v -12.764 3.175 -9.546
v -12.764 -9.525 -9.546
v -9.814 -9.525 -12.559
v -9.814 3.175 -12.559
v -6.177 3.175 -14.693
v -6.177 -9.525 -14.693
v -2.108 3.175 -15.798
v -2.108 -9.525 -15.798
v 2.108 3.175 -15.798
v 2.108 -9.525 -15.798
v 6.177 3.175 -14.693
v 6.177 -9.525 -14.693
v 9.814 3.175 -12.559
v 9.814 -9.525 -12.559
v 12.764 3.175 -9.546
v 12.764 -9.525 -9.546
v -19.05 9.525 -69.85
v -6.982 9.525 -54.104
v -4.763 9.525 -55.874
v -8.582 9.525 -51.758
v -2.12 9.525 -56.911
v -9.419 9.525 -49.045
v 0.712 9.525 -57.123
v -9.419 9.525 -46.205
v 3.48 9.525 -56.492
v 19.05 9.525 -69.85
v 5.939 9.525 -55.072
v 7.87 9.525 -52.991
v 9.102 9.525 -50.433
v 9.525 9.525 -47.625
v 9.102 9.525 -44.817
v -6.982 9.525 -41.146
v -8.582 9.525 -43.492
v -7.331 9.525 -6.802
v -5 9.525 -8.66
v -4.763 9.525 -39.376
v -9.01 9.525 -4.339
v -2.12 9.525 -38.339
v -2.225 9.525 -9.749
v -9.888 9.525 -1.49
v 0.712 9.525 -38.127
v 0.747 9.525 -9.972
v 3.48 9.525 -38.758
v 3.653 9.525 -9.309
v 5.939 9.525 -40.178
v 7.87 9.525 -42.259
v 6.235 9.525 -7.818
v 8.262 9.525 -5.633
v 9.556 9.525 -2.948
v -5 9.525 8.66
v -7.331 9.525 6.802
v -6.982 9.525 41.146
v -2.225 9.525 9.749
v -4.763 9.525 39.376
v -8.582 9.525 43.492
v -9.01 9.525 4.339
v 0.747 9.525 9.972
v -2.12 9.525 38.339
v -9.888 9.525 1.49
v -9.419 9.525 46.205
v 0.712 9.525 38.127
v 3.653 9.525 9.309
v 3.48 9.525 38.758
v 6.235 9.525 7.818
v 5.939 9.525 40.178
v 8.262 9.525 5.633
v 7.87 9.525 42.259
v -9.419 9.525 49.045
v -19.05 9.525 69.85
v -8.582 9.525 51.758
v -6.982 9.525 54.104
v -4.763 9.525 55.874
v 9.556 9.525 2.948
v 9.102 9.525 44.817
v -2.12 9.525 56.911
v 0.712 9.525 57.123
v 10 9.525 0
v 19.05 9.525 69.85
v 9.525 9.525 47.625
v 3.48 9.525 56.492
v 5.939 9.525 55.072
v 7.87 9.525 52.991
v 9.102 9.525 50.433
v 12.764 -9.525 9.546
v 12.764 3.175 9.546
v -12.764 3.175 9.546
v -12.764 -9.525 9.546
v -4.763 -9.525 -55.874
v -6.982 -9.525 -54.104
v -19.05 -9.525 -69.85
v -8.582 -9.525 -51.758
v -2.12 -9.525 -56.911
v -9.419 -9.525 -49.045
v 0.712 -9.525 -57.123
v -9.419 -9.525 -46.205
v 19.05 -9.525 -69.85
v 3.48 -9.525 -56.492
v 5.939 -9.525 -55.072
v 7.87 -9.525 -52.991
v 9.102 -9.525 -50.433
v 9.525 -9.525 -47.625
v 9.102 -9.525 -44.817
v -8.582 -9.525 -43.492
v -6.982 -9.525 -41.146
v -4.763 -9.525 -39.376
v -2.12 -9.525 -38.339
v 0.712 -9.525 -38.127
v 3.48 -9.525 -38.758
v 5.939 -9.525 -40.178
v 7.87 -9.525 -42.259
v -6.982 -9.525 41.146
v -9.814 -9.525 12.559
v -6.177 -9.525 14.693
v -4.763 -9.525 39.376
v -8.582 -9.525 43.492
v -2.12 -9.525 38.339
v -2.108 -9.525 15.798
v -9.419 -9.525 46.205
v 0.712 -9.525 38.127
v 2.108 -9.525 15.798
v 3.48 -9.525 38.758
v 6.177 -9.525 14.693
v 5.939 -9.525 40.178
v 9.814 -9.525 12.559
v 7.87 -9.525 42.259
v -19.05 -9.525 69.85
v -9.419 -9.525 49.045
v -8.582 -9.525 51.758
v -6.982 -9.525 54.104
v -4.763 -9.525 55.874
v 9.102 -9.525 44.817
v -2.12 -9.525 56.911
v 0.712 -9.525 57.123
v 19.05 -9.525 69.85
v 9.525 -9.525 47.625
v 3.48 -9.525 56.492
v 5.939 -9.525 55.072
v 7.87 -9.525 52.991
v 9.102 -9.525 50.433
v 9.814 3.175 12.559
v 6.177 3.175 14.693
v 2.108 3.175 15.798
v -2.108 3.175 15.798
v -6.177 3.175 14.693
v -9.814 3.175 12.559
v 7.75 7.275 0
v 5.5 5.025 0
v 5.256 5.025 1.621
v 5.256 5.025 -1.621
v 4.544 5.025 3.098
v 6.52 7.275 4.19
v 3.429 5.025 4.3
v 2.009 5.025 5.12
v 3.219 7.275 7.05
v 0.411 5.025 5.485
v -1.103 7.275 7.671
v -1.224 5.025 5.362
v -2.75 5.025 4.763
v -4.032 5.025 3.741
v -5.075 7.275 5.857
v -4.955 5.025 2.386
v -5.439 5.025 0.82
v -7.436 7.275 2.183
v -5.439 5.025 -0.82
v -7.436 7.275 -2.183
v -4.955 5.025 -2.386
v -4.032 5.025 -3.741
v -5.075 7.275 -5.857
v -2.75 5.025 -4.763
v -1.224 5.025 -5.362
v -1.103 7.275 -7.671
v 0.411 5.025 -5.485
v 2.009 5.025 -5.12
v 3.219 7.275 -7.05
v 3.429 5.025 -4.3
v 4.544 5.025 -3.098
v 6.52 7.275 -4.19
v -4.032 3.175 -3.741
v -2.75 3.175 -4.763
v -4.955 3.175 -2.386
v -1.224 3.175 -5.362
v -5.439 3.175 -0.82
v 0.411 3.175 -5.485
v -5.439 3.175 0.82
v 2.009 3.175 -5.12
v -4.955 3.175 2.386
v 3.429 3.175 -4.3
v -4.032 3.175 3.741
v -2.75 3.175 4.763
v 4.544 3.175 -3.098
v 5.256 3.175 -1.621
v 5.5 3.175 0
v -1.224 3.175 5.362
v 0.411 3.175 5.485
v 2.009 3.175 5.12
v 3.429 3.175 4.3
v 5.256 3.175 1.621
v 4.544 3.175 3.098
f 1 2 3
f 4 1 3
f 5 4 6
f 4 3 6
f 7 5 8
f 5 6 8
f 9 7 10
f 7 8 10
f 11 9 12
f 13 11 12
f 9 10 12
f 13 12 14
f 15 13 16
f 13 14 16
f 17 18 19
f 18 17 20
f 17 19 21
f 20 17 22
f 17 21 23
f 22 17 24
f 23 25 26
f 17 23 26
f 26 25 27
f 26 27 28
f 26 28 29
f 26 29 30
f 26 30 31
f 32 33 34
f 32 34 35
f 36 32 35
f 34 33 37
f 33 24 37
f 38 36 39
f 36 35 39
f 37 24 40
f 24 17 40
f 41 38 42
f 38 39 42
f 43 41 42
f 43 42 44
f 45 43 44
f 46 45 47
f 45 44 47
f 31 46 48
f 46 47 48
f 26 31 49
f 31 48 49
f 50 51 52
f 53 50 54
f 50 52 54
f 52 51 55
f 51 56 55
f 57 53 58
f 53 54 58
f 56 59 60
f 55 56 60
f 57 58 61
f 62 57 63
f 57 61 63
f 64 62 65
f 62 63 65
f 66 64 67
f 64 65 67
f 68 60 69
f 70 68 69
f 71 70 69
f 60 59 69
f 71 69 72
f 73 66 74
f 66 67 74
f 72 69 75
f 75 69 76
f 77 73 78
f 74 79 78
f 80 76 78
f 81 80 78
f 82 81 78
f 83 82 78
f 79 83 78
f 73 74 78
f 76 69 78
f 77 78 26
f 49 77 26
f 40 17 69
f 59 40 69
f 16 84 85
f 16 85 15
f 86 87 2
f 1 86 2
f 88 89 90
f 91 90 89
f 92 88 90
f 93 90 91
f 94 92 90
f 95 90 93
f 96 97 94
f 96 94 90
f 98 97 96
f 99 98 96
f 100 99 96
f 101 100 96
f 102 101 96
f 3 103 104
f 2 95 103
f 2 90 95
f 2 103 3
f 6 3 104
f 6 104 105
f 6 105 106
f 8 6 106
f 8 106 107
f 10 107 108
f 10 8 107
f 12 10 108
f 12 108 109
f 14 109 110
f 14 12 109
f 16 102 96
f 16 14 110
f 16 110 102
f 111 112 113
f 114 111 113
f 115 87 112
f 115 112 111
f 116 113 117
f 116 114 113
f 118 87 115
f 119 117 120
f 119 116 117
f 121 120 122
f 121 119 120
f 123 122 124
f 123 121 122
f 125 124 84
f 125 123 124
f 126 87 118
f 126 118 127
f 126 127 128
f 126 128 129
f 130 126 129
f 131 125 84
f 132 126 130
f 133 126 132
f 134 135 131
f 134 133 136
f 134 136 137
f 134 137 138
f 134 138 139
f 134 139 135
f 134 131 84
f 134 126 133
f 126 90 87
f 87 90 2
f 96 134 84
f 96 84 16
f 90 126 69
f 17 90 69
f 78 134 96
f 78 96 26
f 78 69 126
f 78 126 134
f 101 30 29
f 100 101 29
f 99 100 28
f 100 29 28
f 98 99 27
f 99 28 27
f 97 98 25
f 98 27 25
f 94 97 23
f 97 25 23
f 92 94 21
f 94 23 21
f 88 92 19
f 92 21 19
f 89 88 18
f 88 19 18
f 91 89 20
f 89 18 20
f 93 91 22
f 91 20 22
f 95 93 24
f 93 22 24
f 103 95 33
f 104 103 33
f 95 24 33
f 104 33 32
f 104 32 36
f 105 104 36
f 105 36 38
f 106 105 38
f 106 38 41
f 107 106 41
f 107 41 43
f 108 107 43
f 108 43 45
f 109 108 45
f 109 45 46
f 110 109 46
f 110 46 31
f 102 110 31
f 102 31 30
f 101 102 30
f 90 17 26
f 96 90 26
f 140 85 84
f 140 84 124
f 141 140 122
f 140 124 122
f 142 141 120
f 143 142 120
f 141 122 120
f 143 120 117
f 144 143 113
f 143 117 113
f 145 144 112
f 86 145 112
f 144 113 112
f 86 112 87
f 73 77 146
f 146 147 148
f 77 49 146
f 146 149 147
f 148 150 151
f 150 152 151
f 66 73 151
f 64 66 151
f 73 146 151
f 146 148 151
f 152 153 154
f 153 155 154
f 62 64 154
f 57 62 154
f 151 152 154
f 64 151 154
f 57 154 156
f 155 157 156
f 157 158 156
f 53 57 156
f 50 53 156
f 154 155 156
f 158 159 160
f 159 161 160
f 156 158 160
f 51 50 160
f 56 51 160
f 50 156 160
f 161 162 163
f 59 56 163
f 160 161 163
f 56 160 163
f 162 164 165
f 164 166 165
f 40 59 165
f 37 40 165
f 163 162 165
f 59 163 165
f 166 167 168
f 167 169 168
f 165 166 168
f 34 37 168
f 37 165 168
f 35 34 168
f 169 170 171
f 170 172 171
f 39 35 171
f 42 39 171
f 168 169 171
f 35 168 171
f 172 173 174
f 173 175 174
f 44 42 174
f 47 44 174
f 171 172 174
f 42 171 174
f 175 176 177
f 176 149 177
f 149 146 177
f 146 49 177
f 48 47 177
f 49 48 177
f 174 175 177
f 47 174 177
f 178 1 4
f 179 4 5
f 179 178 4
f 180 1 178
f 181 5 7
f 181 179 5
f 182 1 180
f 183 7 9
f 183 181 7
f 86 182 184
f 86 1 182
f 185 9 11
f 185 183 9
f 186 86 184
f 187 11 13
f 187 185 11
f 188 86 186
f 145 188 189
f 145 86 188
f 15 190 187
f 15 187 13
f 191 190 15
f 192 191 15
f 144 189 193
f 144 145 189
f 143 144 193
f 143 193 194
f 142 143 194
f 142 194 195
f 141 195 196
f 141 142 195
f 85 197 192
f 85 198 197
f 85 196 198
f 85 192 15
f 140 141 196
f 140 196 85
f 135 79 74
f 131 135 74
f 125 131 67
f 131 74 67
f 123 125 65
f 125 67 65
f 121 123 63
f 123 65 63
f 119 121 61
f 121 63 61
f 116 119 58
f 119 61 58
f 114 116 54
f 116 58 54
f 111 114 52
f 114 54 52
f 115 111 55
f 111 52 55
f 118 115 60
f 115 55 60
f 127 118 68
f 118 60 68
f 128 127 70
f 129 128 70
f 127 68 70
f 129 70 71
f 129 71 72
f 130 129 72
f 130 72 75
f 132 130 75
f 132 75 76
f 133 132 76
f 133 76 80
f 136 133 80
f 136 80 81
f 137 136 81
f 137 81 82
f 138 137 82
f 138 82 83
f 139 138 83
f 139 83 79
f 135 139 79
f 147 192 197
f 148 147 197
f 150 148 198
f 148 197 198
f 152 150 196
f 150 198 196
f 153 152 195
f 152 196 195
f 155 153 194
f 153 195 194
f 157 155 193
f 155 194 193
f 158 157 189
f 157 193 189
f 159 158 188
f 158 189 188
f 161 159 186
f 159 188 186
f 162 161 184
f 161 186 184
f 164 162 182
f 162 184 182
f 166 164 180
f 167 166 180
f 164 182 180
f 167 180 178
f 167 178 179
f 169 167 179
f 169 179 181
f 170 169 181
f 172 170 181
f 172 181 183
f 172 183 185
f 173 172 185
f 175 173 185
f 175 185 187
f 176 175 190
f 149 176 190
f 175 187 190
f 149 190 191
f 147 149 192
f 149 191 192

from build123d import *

# Parameters (mm, degrees)
SKETCH1_W                                        = 38.1
SKETCH1_H                                        = 19.05
EXTRUDE1_DEPTH                                   = 69.85
CUT_EXTRUDE1_REACH                               = 21.05
SKETCH2_R                                        = 9.525
CSK_FOR_M10_FLAT_HEAD_MACHINE_SCREW1_D           = 11
CSK_FOR_M10_FLAT_HEAD_MACHINE_SCREW1_DEPTH       = 29.464
CSK_FOR_M10_FLAT_HEAD_MACHINE_SCREW1_CSINK_D     = 20
CSK_FOR_M10_FLAT_HEAD_MACHINE_SCREW1_CSINK_ANGLE = 90
CSK_FOR_M10_FLAT_HEAD_MACHINE_SCREW1_TIP         = 3.304733405
SKETCH5_R                                        = 15.9385
CUT_EXTRUDE2_DEPTH                               = 12.7
BOSS_EXTRUDE1_DEPTH                              = 12.7


with BuildPart() as part:
    # Sketch1 → Extrude1 (new body, symmetric)
    with BuildSketch(Plane.XY):
        Rectangle(SKETCH1_W, SKETCH1_H)
    extrude(amount=EXTRUDE1_DEPTH, both=True)

    # Sketch2 → Cut-Extrude1 (cut, up to next)
    with BuildSketch(Plane(origin=(0, 9.525, 0), x_dir=(1, 0, 0), z_dir=(0, 1, 0)), mode=Mode.PRIVATE) as cut_extrude1_sk1:
        with Locations((0, 47.625)):
            Circle(SKETCH2_R)
    cut_extrude1_tool1 = extrude(cut_extrude1_sk1.sketch, amount=-CUT_EXTRUDE1_REACH, mode=Mode.PRIVATE) & part.part
    add(cut_extrude1_tool1.solids().sort_by_distance((0, 9.525, -47.625))[0], mode=Mode.SUBTRACT)
    # Sketch2 → Cut-Extrude1 (cut, up to next)
    with BuildSketch(Plane(origin=(0, 9.525, 0), x_dir=(1, 0, 0), z_dir=(0, 1, 0)), mode=Mode.PRIVATE) as cut_extrude1_sk2:
        with Locations((0, -47.625)):
            Circle(SKETCH2_R)
    cut_extrude1_tool2 = extrude(cut_extrude1_sk2.sketch, amount=-CUT_EXTRUDE1_REACH, mode=Mode.PRIVATE) & part.part
    add(cut_extrude1_tool2.solids().sort_by_distance((0, 9.525, 47.625))[0], mode=Mode.SUBTRACT)

    # CSK for M10 Flat Head Machine Screw1
    with Locations(Plane(origin=(0, 9.525, 0), x_dir=(-1, 0, 0), z_dir=(0, 1, 0))):
        with Locations((0, 0)):
            CounterSinkHole(CSK_FOR_M10_FLAT_HEAD_MACHINE_SCREW1_D / 2, CSK_FOR_M10_FLAT_HEAD_MACHINE_SCREW1_CSINK_D / 2, depth=CSK_FOR_M10_FLAT_HEAD_MACHINE_SCREW1_DEPTH, counter_sink_angle=CSK_FOR_M10_FLAT_HEAD_MACHINE_SCREW1_CSINK_ANGLE)
            with Locations((0, 0, -(CSK_FOR_M10_FLAT_HEAD_MACHINE_SCREW1_DEPTH + CSK_FOR_M10_FLAT_HEAD_MACHINE_SCREW1_TIP / 2))):  # 118° drill point
                Cone(0, CSK_FOR_M10_FLAT_HEAD_MACHINE_SCREW1_D / 2, CSK_FOR_M10_FLAT_HEAD_MACHINE_SCREW1_TIP, mode=Mode.SUBTRACT)

    # Sketch5 → Cut-Extrude2 (cut)
    with BuildSketch(Plane.XZ.offset(9.525)):
        Circle(SKETCH5_R)
    extrude(amount=-CUT_EXTRUDE2_DEPTH, mode=Mode.SUBTRACT)

    # Sketch6 → Boss-Extrude1 (add)
    with BuildSketch(Plane.XZ.offset(9.525)):
        with BuildLine():
            Line((-12.7635, 9.5461432), (-12.7635, -9.5461432))
            ThreePointArc((-12.7635, -9.5461432), (-15.9385, 0), (-12.7635, 9.5461432))
        make_face()
        with BuildLine():
            Line((12.7635, 9.5461432), (12.7635, -9.5461432))
            ThreePointArc((12.7635, -9.5461432), (15.9385, 0), (12.7635, 9.5461432))
        make_face()
    extrude(amount=-BOSS_EXTRUDE1_DEPTH)


solid = part.part
